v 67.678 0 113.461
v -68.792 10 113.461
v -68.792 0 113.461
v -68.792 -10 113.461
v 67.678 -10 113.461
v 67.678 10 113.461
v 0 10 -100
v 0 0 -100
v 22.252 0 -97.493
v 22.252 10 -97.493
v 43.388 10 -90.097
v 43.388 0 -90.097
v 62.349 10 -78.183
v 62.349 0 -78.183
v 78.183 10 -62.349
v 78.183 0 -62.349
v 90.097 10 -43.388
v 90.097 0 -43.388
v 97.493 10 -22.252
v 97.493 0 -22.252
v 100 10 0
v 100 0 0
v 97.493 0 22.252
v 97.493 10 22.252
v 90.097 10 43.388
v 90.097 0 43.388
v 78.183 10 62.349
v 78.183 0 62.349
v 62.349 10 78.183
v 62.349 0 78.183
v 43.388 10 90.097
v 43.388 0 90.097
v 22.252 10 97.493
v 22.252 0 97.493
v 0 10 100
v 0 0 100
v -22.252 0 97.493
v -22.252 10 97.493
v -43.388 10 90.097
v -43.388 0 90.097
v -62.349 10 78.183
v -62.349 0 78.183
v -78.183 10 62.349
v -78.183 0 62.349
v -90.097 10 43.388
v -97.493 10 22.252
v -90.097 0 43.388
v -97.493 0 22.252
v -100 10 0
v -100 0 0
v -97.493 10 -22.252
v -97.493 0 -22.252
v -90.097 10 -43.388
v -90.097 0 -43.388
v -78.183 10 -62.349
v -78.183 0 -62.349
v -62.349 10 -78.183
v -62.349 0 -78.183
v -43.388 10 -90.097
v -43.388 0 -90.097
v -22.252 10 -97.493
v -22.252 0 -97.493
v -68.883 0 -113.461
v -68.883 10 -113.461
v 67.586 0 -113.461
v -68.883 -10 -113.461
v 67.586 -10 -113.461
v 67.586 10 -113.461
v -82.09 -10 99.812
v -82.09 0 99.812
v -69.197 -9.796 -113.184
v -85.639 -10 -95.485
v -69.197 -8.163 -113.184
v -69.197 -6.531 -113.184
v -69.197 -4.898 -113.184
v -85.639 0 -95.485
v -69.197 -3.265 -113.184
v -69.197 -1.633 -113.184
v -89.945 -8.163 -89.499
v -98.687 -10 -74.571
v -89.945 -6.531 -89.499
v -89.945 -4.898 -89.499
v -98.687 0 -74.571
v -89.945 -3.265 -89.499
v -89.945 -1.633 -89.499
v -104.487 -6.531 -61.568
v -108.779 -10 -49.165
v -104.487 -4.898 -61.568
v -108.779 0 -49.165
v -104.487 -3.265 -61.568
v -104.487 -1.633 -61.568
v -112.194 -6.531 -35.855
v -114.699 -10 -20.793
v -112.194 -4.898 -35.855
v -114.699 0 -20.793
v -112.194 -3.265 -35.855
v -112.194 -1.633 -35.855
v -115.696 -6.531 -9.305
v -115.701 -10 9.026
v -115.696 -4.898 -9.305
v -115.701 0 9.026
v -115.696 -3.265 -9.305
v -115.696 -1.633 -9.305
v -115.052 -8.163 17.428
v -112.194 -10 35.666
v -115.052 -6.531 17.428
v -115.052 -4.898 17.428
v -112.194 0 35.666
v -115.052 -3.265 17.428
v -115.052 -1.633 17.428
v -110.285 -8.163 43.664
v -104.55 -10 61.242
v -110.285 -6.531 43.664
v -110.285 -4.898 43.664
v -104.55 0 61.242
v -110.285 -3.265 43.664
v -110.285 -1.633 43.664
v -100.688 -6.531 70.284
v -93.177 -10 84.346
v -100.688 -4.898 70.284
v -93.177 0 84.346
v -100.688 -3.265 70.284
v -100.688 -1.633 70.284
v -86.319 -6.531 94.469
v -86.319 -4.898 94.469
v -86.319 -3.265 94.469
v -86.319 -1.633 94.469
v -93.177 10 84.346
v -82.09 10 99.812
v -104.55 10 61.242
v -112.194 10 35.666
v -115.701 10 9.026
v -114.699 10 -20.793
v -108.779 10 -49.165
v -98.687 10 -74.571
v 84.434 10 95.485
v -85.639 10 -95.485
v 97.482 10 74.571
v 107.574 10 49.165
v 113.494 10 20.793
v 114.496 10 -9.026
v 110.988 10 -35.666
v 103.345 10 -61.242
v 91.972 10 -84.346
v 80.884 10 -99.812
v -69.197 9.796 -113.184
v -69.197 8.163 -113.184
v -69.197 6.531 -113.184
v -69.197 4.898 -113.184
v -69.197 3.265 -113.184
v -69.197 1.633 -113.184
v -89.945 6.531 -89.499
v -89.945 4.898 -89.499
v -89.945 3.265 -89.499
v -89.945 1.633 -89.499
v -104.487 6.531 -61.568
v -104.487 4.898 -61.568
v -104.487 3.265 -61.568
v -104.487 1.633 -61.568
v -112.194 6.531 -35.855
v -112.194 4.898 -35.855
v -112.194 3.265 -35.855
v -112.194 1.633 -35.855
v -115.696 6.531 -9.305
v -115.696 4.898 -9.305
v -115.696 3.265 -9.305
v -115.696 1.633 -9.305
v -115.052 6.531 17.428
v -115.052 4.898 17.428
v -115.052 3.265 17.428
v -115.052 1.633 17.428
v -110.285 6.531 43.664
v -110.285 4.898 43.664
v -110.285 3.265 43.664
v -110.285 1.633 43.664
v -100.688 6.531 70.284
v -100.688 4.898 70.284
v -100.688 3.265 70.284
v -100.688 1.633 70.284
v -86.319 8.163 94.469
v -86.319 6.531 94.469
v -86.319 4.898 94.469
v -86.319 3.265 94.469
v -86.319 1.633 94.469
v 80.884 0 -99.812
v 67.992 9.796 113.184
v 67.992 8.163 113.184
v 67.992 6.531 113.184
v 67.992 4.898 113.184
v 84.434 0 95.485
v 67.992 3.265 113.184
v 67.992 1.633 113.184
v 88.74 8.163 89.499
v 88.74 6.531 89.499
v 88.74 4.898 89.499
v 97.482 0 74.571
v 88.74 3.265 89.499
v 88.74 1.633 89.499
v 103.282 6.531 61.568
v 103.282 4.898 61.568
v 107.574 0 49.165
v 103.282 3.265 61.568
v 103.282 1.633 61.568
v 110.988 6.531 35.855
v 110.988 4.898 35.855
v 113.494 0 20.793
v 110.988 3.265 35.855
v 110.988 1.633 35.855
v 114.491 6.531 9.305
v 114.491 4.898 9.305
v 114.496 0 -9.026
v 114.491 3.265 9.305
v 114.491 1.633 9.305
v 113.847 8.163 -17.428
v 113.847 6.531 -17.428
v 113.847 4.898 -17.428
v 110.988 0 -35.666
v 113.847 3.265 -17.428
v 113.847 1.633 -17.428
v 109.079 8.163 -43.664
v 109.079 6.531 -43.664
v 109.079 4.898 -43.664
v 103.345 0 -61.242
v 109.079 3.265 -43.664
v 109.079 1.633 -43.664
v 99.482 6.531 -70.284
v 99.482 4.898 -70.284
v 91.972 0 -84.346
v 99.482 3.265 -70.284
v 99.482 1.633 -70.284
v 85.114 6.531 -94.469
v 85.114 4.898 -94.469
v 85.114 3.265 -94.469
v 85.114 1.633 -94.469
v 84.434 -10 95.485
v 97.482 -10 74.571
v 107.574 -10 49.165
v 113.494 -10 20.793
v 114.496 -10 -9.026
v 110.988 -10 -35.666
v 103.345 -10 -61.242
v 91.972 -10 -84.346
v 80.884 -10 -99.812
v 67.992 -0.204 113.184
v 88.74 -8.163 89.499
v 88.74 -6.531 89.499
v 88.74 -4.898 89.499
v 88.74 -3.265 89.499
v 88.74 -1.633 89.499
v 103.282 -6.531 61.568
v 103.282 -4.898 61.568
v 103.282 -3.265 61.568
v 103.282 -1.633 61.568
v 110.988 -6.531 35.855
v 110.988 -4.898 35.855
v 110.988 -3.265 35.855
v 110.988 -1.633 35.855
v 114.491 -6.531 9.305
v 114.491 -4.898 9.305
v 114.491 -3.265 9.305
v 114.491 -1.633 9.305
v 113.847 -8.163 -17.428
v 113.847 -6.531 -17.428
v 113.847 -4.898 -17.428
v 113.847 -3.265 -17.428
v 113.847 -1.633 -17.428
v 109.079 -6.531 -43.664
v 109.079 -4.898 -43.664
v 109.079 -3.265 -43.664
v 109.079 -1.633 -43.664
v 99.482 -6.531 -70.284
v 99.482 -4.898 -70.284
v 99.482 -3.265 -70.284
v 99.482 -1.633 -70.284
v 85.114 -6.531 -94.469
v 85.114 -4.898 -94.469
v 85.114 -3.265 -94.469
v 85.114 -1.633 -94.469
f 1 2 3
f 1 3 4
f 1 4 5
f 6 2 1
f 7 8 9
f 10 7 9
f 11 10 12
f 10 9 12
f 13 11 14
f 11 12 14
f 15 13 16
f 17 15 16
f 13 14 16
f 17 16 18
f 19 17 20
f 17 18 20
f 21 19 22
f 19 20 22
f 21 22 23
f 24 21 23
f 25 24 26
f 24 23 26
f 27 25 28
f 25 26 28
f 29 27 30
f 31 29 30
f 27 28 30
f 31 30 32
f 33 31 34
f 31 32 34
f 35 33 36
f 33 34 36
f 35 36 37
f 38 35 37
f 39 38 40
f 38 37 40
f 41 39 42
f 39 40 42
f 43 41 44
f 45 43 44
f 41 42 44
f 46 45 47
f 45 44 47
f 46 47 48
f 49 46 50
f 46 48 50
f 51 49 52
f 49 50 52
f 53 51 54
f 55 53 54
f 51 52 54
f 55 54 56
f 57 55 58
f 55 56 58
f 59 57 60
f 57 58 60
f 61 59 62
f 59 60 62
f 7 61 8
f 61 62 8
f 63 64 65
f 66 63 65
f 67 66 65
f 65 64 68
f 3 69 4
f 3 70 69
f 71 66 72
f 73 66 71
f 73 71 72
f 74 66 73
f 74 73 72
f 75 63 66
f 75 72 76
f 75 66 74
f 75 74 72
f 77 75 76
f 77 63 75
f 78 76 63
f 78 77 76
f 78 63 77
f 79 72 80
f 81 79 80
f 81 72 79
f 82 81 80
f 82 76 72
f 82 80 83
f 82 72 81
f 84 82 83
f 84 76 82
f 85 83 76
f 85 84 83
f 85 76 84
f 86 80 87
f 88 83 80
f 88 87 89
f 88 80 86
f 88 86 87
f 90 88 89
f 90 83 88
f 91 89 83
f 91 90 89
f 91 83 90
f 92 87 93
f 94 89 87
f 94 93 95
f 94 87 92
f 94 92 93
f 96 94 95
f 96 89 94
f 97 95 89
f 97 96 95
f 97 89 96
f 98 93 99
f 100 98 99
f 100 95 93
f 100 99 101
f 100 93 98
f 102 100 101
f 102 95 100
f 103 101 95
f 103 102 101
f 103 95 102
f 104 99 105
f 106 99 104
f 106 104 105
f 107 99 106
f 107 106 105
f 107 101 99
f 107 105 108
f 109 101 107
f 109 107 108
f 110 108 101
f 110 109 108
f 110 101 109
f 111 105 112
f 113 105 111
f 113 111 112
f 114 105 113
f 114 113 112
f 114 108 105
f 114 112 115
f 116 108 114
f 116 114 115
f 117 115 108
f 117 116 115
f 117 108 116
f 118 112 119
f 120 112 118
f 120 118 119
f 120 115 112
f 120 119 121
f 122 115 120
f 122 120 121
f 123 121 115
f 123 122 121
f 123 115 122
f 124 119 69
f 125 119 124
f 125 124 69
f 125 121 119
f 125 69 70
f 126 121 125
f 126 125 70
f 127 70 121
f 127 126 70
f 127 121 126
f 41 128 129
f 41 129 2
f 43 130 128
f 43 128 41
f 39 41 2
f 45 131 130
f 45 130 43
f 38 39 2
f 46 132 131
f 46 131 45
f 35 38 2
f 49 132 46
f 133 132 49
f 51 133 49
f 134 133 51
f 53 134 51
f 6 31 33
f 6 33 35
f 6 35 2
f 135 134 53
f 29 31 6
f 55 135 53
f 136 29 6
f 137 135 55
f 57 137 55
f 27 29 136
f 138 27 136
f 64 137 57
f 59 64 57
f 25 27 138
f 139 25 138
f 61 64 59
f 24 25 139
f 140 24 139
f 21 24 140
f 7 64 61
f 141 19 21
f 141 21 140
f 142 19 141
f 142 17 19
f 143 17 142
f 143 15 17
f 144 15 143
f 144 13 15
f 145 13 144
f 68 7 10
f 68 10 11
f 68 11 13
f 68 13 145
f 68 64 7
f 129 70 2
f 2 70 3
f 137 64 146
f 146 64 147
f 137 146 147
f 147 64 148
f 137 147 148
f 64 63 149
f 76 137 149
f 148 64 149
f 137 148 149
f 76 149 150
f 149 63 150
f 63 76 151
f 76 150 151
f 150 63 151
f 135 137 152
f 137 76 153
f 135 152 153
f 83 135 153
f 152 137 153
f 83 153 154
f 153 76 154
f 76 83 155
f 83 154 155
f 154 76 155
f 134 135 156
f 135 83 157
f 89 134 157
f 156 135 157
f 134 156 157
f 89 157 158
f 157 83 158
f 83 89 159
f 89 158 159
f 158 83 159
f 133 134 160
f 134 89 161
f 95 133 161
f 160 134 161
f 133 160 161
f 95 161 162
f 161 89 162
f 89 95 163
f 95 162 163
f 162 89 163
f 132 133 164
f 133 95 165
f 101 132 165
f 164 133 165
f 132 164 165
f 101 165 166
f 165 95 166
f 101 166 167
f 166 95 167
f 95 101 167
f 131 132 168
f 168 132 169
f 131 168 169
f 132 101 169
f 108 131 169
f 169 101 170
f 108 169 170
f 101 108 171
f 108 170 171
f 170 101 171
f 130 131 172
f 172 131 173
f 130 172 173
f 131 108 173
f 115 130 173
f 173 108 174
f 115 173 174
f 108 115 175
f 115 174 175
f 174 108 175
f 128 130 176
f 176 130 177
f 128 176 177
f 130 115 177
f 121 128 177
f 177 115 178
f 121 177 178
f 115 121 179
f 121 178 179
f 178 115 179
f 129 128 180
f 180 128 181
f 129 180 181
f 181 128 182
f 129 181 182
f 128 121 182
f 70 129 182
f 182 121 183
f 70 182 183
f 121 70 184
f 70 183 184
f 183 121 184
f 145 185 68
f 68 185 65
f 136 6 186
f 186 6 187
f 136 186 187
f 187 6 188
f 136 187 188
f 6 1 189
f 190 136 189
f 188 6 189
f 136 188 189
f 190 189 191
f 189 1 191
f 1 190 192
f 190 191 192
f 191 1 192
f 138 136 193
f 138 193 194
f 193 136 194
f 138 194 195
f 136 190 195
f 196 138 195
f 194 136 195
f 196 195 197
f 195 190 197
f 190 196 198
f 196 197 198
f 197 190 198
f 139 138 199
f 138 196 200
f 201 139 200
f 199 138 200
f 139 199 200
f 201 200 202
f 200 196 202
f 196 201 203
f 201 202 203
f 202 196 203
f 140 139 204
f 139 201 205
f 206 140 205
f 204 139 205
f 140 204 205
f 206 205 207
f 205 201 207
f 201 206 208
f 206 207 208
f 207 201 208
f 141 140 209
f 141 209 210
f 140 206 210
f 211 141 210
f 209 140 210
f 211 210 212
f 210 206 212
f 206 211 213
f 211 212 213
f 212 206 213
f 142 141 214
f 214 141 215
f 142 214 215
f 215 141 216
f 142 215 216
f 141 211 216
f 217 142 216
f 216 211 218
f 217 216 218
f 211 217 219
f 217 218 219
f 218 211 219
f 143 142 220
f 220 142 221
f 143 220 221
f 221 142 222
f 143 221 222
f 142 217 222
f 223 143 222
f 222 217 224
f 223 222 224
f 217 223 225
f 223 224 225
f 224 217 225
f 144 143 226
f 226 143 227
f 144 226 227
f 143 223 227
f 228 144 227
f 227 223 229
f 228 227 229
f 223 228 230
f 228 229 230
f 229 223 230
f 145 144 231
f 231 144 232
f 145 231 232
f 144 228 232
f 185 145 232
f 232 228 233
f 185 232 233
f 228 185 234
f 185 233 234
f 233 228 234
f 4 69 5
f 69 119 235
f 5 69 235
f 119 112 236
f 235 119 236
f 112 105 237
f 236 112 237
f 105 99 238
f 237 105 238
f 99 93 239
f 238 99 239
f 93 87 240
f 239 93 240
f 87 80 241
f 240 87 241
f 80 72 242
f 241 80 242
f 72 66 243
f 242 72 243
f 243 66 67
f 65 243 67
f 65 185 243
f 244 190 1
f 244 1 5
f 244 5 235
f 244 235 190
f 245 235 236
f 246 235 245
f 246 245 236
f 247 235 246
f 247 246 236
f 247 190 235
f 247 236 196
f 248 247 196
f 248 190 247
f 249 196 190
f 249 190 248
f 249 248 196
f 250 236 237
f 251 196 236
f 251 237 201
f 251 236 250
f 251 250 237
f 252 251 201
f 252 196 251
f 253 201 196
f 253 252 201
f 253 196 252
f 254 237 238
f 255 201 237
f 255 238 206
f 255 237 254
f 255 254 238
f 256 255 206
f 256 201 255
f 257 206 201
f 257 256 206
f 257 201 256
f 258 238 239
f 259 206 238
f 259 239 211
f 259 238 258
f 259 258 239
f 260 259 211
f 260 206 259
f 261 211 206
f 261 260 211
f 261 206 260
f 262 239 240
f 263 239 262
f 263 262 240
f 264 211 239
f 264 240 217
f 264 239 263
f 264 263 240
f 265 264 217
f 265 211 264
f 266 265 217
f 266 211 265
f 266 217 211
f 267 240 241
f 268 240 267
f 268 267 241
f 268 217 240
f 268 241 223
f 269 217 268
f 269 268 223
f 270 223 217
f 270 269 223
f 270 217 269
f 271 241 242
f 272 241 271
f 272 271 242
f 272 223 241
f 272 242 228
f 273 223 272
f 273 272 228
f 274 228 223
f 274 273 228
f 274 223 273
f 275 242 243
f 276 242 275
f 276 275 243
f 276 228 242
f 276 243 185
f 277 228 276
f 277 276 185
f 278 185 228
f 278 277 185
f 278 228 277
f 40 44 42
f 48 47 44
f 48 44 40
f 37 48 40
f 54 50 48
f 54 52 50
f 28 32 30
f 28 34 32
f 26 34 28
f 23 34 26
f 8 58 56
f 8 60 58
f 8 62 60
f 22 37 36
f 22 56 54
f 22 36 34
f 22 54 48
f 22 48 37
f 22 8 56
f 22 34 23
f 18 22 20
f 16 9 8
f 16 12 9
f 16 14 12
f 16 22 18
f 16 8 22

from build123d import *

# Parameters (mm, degrees)
BOSS_EXTRUDE1_DEPTH     = 10
SKETCH1_3_R             = 100
BOSS_EXTRUDE2_DEPTH     = 10
SKETCH2_W               = 214.561996695
SKETCH2_H               = 67.979229187
CUT_EXTRUDE1_DEPTH      = 1.0000001
CUT_EXTRUDE1_DEPTH_BACK = 21.0000001


with BuildPart() as part:
    # Sketch1 → Boss-Extrude1 (new body, symmetric)
    with BuildSketch(Plane(origin=(0, 0, 0), x_dir=(1, 0, 0), z_dir=(0, 1, 0))):
        with BuildLine():
            add(Edge.make_bspline(
                [(0.976121303, -140.025549951), (2.374162629, -140.009491535), (3.771517421, -139.962591197), (7.291103261, -139.767278285), (9.398709168, -139.579437143), (15.675293836, -138.811953228), (19.799111475, -138.029795642), (27.929813311, -135.94328184), (31.936744561, -134.639135756), (37.859712235, -132.29247735), (39.804221595, -131.450894746), (43.623558737, -129.659192276), (45.500465995, -128.708195239), (51.0358335, -125.694698111), (54.599581786, -123.47277318), (59.764651016, -119.835967833), (61.45615035, -118.57288108), (63.948397978, -116.602501944), (64.77264308, -115.932207196), (66.398329816, -114.572915867), (67.200371286, -113.883479536), (71.15781434, -110.388473165), (74.15557851, -107.440023102), (79.839048175, -101.260277994), (82.526531921, -98.030594728), (86.325197715, -92.975281331), (87.552083684, -91.254523379), (89.92827313, -87.74268795), (91.071161278, -85.961213119), (93.264204581, -82.358005966), (94.315491716, -80.534886626), (96.329914932, -76.846718964), (97.291887312, -74.981117129), (100.057054093, -69.326876807), (101.744965365, -65.483403988), (104.050207299, -59.610400761), (104.780795243, -57.634741095), (106.166809965, -53.647671411), (106.823248507, -51.632689638), (108.669969422, -45.566700204), (109.738950442, -41.49400287), (111.566738836, -33.293705648), (112.32543315, -29.166085749), (113.538180225, -20.85692261), (113.992347502, -16.67539964), (114.36903765, -11.414684455), (114.434803631, -10.360847109), (114.547109075, -8.249769211), (114.593657534, -7.191844363), (114.703986475, -4.02388278), (114.738672, -1.916622031), (114.721208012, 8.596531177), (114.100106338, 16.933423498), (112.26337389, 29.32899767), (111.499343946, 33.442447781), (110.118494221, 39.584146802), (109.369324409, 42.647871971), (108.529677635, 45.700624473), (107.949499474, 47.733317125), (107.648881576, 48.749432437), (106.100547872, 53.802562864), (104.714467284, 57.768944772), (101.648347062, 65.549912048), (99.96820604, 69.364445062), (97.222621896, 74.969865164), (96.268251936, 76.818108957), (94.2727099, 80.469773084), (93.232568116, 82.273725448), (89.982350098, 87.618559335), (87.642859175, 91.092612835), (84.48192294, 95.313016777), (83.837654689, 96.150859096), (82.525451012, 97.814322319), (81.856640259, 98.64121338), (79.822125033, 101.093717437), (78.430527447, 102.688859664), (74.149311898, 107.353958125), (71.153616848, 110.303977016), (64.867354765, 115.870614214), (61.576656322, 118.487083942), (56.404777152, 122.145142784), (54.641398693, 123.31992646), (51.934089957, 125.011728379), (51.023681699, 125.562366877), (49.193658371, 126.632857883), (48.273010775, 127.153359084), (43.641538937, 129.682001779), (39.846190182, 131.469016566), (32.072993706, 134.565606006), (28.09510057, 135.875061848), (21.983291629, 137.459987939), (19.921721798, 137.924724312), (16.791518565, 138.522812496), (15.740120954, 138.705899718), (13.634978124, 139.036596855), (12.581020534, 139.184317529), (8.013946499, 139.747161721), (4.486924522, 139.985449555), (0.944318009, 140.025549951)],
                knots=[0.005345243, 0.005345243, 0.005345243, 0.005345243, 0.015625, 0.015625, 0.03125, 0.03125, 0.0625, 0.0625, 0.09375, 0.09375, 0.109375, 0.109375, 0.125, 0.125, 0.15625, 0.15625, 0.171875, 0.171875, 0.1796875, 0.1796875, 0.1875, 0.1875, 0.21875, 0.21875, 0.25, 0.25, 0.265625, 0.265625, 0.28125, 0.28125, 0.296875, 0.296875, 0.3125, 0.3125, 0.34375, 0.34375, 0.359375, 0.359375, 0.375, 0.375, 0.40625, 0.40625, 0.4375, 0.4375, 0.46875, 0.46875, 0.4765625, 0.4765625, 0.484375, 0.484375, 0.5, 0.5, 0.5625, 0.5625, 0.59375, 0.59375, 0.609375, 0.6171875, 0.6171875, 0.625, 0.625, 0.65625, 0.65625, 0.6875, 0.6875, 0.703125, 0.703125, 0.71875, 0.71875, 0.75, 0.75, 0.7578125, 0.7578125, 0.765625, 0.765625, 0.78125, 0.78125, 0.8125, 0.8125, 0.84375, 0.84375, 0.859375, 0.859375, 0.8671875, 0.8671875, 0.875, 0.875, 0.90625, 0.90625, 0.9375, 0.9375, 0.953125, 0.953125, 0.9609375, 0.9609375, 0.96875, 0.96875, 0.994746559, 0.994746559, 0.994746559, 0.994746559], degree=3))
            Line((0.944318009, 140.025549951), (0, 140.025549951))
            Line((0, 140.025549951), (0, 100))
            ThreePointArc((0, 100), (70.710678119, 70.710678119), (100, 0))
            ThreePointArc((100, 0), (70.710678119, -70.710678119), (0, -100))
            Line((0, -100), (0, -140.025549951))
            Line((0, -140.025549951), (0.976121303, -140.025549951))
        make_face()
        with BuildLine():
            Line((0, 100), (0, 140.025549951))
            add(Edge.make_bspline(
                [(0, 140.025549951), (-0.197417557, 140.027819409), (-0.394821383, 140.02947205), (-0.592211495, 140.030508539)],
                knots=[0, 0, 0, 0, 0.001450863, 0.001450863, 0.001450863, 0.001450863], degree=3))
            add(Edge.make_bspline(
                [(-0.592211495, 140.030508539), (-2.520604536, 140.040634466), (-4.447688548, 139.99195347), (-8.496389648, 139.767278285), (-10.603995555, 139.579437143), (-16.880580223, 138.811953228), (-21.004397862, 138.029795642), (-29.135099698, 135.94328184), (-33.142030948, 134.639135756), (-39.064998622, 132.29247735), (-41.009507982, 131.450894746), (-44.828845124, 129.659192276), (-46.705752383, 128.708195239), (-52.241119887, 125.694698111), (-55.804868173, 123.47277318), (-60.969937403, 119.835967833), (-62.661436737, 118.57288108), (-65.153684365, 116.602501944), (-65.977929468, 115.932207196), (-67.603616203, 114.572915867), (-68.405657673, 113.883479536), (-72.363100727, 110.388473165), (-75.360864897, 107.440023102), (-81.044334562, 101.260277994), (-83.731818308, 98.030594728), (-87.530484102, 92.975281331), (-88.757370071, 91.254523379), (-91.133559517, 87.74268795), (-92.276447665, 85.961213119), (-94.469490968, 82.358005966), (-95.520778103, 80.534886626), (-97.535201319, 76.846718964), (-98.497173699, 74.981117129), (-101.26234048, 69.326876807), (-102.950251753, 65.483403988), (-105.255493686, 59.610400761), (-105.98608163, 57.634741095), (-107.372096352, 53.647671411), (-108.028534894, 51.632689638), (-109.875255809, 45.566700204), (-110.944236829, 41.49400287), (-112.772025223, 33.293705648), (-113.530719537, 29.166085749), (-114.743466612, 20.85692261), (-115.197633889, 16.67539964), (-115.574324037, 11.414684455), (-115.640090018, 10.360847109), (-115.752395462, 8.249769211), (-115.798943921, 7.191844363), (-115.909272862, 4.02388278), (-115.943958388, 1.916622031), (-115.926494399, -8.596531177), (-115.305392725, -16.933423498), (-113.468660278, -29.32899767), (-112.704630333, -33.442447781), (-111.323780608, -39.584146802), (-110.574610796, -42.647871971), (-109.734964023, -45.700624473), (-109.154785861, -47.733317125), (-108.854167963, -48.749432437), (-107.305834259, -53.802562864), (-105.919753671, -57.768944772), (-102.85363345, -65.549912048), (-101.173492427, -69.364445062), (-98.427908283, -74.969865164), (-97.473538324, -76.818108957), (-95.477996287, -80.469773084), (-94.437854503, -82.273725448), (-91.187636485, -87.618559335), (-88.848145562, -91.092612835), (-85.687209327, -95.313016777), (-85.042941076, -96.150859096), (-83.730737399, -97.814322319), (-83.061926646, -98.64121338), (-81.02741142, -101.093717437), (-79.635813834, -102.688859664), (-75.354598285, -107.353958125), (-72.358903236, -110.303977016), (-66.072641152, -115.870614214), (-62.781942709, -118.487083942), (-57.610063539, -122.145142784), (-55.84668508, -123.31992646), (-53.139376344, -125.011728379), (-52.228968086, -125.562366877), (-50.398944758, -126.632857883), (-49.478297162, -127.153359084), (-44.846825324, -129.682001779), (-41.051476569, -131.469016566), (-33.278280093, -134.565606006), (-29.300386957, -135.875061848), (-23.188578016, -137.459987939), (-21.127008185, -137.924724312), (-17.996804952, -138.522812496), (-16.945407341, -138.705899718), (-14.840264511, -139.036596855), (-13.786306921, -139.184317529), (-8.711843514, -139.809692163), (-4.672693328, -140.050246998), (-0.613074893, -140.030508539)],
                knots=[0.001450863, 0.001450863, 0.001450863, 0.001450863, 0.015625, 0.015625, 0.03125, 0.03125, 0.0625, 0.0625, 0.09375, 0.09375, 0.109375, 0.109375, 0.125, 0.125, 0.15625, 0.15625, 0.171875, 0.171875, 0.1796875, 0.1796875, 0.1875, 0.1875, 0.21875, 0.21875, 0.25, 0.25, 0.265625, 0.265625, 0.28125, 0.28125, 0.296875, 0.296875, 0.3125, 0.3125, 0.34375, 0.34375, 0.359375, 0.359375, 0.375, 0.375, 0.40625, 0.40625, 0.4375, 0.4375, 0.46875, 0.46875, 0.4765625, 0.4765625, 0.484375, 0.484375, 0.5, 0.5, 0.5625, 0.5625, 0.59375, 0.59375, 0.609375, 0.6171875, 0.6171875, 0.625, 0.625, 0.65625, 0.65625, 0.6875, 0.6875, 0.703125, 0.703125, 0.71875, 0.71875, 0.75, 0.75, 0.7578125, 0.7578125, 0.765625, 0.765625, 0.78125, 0.78125, 0.8125, 0.8125, 0.84375, 0.84375, 0.859375, 0.859375, 0.8671875, 0.8671875, 0.875, 0.875, 0.90625, 0.90625, 0.9375, 0.9375, 0.953125, 0.953125, 0.9609375, 0.9609375, 0.96875, 0.96875, 0.998502653, 0.998502653, 0.998502653, 0.998502653], degree=3))
            add(Edge.make_bspline(
                [(-0.613074893, -140.030508539), (-0.408768455, -140.029515171), (-0.204410176, -140.027862544), (0, -140.025549951)],
                knots=[0.998502653, 0.998502653, 0.998502653, 0.998502653, 1, 1, 1, 1], degree=3))
            Line((0, -140.025549951), (0, -100))
            ThreePointArc((0, -100), (-100, 0), (0, 100))
        make_face()
    extrude(amount=BOSS_EXTRUDE1_DEPTH, both=True)

    # Sketch1<3> → Boss-Extrude2 (add)
    with BuildSketch(Plane(origin=(0, 0, 0), x_dir=(1, 0, 0), z_dir=(0, 1, 0))):
        Circle(SKETCH1_3_R)
        with BuildLine():
            ThreePointArc((100, 0), (70.710678119, 70.710678119), (0, 100))
            Line((0, 100), (0, -100))
            ThreePointArc((0, -100), (70.710678119, -70.710678119), (100, 0))
        make_face()
        with BuildLine():
            Line((0, -100), (0, 100))
            ThreePointArc((0, 100), (-100, 0), (0, -100))
        make_face()
    extrude(amount=-BOSS_EXTRUDE2_DEPTH)

    # Sketch2 → Cut-Extrude1 (cut, two sides)
    with BuildSketch(Plane(origin=(0, 10, 0), x_dir=(1, 0, 0), z_dir=(0, 1, 0))) as cut_extrude1_sk:
        with Locations((-8.659676613, -147.450639379)):
            Rectangle(SKETCH2_W, SKETCH2_H)
        with Locations((-8.659676613, 147.450639379)):
            Rectangle(SKETCH2_W, SKETCH2_H)
    extrude(amount=CUT_EXTRUDE1_DEPTH, mode=Mode.SUBTRACT)
    extrude(cut_extrude1_sk.sketch, amount=-CUT_EXTRUDE1_DEPTH_BACK, mode=Mode.SUBTRACT)


solid = part.part
